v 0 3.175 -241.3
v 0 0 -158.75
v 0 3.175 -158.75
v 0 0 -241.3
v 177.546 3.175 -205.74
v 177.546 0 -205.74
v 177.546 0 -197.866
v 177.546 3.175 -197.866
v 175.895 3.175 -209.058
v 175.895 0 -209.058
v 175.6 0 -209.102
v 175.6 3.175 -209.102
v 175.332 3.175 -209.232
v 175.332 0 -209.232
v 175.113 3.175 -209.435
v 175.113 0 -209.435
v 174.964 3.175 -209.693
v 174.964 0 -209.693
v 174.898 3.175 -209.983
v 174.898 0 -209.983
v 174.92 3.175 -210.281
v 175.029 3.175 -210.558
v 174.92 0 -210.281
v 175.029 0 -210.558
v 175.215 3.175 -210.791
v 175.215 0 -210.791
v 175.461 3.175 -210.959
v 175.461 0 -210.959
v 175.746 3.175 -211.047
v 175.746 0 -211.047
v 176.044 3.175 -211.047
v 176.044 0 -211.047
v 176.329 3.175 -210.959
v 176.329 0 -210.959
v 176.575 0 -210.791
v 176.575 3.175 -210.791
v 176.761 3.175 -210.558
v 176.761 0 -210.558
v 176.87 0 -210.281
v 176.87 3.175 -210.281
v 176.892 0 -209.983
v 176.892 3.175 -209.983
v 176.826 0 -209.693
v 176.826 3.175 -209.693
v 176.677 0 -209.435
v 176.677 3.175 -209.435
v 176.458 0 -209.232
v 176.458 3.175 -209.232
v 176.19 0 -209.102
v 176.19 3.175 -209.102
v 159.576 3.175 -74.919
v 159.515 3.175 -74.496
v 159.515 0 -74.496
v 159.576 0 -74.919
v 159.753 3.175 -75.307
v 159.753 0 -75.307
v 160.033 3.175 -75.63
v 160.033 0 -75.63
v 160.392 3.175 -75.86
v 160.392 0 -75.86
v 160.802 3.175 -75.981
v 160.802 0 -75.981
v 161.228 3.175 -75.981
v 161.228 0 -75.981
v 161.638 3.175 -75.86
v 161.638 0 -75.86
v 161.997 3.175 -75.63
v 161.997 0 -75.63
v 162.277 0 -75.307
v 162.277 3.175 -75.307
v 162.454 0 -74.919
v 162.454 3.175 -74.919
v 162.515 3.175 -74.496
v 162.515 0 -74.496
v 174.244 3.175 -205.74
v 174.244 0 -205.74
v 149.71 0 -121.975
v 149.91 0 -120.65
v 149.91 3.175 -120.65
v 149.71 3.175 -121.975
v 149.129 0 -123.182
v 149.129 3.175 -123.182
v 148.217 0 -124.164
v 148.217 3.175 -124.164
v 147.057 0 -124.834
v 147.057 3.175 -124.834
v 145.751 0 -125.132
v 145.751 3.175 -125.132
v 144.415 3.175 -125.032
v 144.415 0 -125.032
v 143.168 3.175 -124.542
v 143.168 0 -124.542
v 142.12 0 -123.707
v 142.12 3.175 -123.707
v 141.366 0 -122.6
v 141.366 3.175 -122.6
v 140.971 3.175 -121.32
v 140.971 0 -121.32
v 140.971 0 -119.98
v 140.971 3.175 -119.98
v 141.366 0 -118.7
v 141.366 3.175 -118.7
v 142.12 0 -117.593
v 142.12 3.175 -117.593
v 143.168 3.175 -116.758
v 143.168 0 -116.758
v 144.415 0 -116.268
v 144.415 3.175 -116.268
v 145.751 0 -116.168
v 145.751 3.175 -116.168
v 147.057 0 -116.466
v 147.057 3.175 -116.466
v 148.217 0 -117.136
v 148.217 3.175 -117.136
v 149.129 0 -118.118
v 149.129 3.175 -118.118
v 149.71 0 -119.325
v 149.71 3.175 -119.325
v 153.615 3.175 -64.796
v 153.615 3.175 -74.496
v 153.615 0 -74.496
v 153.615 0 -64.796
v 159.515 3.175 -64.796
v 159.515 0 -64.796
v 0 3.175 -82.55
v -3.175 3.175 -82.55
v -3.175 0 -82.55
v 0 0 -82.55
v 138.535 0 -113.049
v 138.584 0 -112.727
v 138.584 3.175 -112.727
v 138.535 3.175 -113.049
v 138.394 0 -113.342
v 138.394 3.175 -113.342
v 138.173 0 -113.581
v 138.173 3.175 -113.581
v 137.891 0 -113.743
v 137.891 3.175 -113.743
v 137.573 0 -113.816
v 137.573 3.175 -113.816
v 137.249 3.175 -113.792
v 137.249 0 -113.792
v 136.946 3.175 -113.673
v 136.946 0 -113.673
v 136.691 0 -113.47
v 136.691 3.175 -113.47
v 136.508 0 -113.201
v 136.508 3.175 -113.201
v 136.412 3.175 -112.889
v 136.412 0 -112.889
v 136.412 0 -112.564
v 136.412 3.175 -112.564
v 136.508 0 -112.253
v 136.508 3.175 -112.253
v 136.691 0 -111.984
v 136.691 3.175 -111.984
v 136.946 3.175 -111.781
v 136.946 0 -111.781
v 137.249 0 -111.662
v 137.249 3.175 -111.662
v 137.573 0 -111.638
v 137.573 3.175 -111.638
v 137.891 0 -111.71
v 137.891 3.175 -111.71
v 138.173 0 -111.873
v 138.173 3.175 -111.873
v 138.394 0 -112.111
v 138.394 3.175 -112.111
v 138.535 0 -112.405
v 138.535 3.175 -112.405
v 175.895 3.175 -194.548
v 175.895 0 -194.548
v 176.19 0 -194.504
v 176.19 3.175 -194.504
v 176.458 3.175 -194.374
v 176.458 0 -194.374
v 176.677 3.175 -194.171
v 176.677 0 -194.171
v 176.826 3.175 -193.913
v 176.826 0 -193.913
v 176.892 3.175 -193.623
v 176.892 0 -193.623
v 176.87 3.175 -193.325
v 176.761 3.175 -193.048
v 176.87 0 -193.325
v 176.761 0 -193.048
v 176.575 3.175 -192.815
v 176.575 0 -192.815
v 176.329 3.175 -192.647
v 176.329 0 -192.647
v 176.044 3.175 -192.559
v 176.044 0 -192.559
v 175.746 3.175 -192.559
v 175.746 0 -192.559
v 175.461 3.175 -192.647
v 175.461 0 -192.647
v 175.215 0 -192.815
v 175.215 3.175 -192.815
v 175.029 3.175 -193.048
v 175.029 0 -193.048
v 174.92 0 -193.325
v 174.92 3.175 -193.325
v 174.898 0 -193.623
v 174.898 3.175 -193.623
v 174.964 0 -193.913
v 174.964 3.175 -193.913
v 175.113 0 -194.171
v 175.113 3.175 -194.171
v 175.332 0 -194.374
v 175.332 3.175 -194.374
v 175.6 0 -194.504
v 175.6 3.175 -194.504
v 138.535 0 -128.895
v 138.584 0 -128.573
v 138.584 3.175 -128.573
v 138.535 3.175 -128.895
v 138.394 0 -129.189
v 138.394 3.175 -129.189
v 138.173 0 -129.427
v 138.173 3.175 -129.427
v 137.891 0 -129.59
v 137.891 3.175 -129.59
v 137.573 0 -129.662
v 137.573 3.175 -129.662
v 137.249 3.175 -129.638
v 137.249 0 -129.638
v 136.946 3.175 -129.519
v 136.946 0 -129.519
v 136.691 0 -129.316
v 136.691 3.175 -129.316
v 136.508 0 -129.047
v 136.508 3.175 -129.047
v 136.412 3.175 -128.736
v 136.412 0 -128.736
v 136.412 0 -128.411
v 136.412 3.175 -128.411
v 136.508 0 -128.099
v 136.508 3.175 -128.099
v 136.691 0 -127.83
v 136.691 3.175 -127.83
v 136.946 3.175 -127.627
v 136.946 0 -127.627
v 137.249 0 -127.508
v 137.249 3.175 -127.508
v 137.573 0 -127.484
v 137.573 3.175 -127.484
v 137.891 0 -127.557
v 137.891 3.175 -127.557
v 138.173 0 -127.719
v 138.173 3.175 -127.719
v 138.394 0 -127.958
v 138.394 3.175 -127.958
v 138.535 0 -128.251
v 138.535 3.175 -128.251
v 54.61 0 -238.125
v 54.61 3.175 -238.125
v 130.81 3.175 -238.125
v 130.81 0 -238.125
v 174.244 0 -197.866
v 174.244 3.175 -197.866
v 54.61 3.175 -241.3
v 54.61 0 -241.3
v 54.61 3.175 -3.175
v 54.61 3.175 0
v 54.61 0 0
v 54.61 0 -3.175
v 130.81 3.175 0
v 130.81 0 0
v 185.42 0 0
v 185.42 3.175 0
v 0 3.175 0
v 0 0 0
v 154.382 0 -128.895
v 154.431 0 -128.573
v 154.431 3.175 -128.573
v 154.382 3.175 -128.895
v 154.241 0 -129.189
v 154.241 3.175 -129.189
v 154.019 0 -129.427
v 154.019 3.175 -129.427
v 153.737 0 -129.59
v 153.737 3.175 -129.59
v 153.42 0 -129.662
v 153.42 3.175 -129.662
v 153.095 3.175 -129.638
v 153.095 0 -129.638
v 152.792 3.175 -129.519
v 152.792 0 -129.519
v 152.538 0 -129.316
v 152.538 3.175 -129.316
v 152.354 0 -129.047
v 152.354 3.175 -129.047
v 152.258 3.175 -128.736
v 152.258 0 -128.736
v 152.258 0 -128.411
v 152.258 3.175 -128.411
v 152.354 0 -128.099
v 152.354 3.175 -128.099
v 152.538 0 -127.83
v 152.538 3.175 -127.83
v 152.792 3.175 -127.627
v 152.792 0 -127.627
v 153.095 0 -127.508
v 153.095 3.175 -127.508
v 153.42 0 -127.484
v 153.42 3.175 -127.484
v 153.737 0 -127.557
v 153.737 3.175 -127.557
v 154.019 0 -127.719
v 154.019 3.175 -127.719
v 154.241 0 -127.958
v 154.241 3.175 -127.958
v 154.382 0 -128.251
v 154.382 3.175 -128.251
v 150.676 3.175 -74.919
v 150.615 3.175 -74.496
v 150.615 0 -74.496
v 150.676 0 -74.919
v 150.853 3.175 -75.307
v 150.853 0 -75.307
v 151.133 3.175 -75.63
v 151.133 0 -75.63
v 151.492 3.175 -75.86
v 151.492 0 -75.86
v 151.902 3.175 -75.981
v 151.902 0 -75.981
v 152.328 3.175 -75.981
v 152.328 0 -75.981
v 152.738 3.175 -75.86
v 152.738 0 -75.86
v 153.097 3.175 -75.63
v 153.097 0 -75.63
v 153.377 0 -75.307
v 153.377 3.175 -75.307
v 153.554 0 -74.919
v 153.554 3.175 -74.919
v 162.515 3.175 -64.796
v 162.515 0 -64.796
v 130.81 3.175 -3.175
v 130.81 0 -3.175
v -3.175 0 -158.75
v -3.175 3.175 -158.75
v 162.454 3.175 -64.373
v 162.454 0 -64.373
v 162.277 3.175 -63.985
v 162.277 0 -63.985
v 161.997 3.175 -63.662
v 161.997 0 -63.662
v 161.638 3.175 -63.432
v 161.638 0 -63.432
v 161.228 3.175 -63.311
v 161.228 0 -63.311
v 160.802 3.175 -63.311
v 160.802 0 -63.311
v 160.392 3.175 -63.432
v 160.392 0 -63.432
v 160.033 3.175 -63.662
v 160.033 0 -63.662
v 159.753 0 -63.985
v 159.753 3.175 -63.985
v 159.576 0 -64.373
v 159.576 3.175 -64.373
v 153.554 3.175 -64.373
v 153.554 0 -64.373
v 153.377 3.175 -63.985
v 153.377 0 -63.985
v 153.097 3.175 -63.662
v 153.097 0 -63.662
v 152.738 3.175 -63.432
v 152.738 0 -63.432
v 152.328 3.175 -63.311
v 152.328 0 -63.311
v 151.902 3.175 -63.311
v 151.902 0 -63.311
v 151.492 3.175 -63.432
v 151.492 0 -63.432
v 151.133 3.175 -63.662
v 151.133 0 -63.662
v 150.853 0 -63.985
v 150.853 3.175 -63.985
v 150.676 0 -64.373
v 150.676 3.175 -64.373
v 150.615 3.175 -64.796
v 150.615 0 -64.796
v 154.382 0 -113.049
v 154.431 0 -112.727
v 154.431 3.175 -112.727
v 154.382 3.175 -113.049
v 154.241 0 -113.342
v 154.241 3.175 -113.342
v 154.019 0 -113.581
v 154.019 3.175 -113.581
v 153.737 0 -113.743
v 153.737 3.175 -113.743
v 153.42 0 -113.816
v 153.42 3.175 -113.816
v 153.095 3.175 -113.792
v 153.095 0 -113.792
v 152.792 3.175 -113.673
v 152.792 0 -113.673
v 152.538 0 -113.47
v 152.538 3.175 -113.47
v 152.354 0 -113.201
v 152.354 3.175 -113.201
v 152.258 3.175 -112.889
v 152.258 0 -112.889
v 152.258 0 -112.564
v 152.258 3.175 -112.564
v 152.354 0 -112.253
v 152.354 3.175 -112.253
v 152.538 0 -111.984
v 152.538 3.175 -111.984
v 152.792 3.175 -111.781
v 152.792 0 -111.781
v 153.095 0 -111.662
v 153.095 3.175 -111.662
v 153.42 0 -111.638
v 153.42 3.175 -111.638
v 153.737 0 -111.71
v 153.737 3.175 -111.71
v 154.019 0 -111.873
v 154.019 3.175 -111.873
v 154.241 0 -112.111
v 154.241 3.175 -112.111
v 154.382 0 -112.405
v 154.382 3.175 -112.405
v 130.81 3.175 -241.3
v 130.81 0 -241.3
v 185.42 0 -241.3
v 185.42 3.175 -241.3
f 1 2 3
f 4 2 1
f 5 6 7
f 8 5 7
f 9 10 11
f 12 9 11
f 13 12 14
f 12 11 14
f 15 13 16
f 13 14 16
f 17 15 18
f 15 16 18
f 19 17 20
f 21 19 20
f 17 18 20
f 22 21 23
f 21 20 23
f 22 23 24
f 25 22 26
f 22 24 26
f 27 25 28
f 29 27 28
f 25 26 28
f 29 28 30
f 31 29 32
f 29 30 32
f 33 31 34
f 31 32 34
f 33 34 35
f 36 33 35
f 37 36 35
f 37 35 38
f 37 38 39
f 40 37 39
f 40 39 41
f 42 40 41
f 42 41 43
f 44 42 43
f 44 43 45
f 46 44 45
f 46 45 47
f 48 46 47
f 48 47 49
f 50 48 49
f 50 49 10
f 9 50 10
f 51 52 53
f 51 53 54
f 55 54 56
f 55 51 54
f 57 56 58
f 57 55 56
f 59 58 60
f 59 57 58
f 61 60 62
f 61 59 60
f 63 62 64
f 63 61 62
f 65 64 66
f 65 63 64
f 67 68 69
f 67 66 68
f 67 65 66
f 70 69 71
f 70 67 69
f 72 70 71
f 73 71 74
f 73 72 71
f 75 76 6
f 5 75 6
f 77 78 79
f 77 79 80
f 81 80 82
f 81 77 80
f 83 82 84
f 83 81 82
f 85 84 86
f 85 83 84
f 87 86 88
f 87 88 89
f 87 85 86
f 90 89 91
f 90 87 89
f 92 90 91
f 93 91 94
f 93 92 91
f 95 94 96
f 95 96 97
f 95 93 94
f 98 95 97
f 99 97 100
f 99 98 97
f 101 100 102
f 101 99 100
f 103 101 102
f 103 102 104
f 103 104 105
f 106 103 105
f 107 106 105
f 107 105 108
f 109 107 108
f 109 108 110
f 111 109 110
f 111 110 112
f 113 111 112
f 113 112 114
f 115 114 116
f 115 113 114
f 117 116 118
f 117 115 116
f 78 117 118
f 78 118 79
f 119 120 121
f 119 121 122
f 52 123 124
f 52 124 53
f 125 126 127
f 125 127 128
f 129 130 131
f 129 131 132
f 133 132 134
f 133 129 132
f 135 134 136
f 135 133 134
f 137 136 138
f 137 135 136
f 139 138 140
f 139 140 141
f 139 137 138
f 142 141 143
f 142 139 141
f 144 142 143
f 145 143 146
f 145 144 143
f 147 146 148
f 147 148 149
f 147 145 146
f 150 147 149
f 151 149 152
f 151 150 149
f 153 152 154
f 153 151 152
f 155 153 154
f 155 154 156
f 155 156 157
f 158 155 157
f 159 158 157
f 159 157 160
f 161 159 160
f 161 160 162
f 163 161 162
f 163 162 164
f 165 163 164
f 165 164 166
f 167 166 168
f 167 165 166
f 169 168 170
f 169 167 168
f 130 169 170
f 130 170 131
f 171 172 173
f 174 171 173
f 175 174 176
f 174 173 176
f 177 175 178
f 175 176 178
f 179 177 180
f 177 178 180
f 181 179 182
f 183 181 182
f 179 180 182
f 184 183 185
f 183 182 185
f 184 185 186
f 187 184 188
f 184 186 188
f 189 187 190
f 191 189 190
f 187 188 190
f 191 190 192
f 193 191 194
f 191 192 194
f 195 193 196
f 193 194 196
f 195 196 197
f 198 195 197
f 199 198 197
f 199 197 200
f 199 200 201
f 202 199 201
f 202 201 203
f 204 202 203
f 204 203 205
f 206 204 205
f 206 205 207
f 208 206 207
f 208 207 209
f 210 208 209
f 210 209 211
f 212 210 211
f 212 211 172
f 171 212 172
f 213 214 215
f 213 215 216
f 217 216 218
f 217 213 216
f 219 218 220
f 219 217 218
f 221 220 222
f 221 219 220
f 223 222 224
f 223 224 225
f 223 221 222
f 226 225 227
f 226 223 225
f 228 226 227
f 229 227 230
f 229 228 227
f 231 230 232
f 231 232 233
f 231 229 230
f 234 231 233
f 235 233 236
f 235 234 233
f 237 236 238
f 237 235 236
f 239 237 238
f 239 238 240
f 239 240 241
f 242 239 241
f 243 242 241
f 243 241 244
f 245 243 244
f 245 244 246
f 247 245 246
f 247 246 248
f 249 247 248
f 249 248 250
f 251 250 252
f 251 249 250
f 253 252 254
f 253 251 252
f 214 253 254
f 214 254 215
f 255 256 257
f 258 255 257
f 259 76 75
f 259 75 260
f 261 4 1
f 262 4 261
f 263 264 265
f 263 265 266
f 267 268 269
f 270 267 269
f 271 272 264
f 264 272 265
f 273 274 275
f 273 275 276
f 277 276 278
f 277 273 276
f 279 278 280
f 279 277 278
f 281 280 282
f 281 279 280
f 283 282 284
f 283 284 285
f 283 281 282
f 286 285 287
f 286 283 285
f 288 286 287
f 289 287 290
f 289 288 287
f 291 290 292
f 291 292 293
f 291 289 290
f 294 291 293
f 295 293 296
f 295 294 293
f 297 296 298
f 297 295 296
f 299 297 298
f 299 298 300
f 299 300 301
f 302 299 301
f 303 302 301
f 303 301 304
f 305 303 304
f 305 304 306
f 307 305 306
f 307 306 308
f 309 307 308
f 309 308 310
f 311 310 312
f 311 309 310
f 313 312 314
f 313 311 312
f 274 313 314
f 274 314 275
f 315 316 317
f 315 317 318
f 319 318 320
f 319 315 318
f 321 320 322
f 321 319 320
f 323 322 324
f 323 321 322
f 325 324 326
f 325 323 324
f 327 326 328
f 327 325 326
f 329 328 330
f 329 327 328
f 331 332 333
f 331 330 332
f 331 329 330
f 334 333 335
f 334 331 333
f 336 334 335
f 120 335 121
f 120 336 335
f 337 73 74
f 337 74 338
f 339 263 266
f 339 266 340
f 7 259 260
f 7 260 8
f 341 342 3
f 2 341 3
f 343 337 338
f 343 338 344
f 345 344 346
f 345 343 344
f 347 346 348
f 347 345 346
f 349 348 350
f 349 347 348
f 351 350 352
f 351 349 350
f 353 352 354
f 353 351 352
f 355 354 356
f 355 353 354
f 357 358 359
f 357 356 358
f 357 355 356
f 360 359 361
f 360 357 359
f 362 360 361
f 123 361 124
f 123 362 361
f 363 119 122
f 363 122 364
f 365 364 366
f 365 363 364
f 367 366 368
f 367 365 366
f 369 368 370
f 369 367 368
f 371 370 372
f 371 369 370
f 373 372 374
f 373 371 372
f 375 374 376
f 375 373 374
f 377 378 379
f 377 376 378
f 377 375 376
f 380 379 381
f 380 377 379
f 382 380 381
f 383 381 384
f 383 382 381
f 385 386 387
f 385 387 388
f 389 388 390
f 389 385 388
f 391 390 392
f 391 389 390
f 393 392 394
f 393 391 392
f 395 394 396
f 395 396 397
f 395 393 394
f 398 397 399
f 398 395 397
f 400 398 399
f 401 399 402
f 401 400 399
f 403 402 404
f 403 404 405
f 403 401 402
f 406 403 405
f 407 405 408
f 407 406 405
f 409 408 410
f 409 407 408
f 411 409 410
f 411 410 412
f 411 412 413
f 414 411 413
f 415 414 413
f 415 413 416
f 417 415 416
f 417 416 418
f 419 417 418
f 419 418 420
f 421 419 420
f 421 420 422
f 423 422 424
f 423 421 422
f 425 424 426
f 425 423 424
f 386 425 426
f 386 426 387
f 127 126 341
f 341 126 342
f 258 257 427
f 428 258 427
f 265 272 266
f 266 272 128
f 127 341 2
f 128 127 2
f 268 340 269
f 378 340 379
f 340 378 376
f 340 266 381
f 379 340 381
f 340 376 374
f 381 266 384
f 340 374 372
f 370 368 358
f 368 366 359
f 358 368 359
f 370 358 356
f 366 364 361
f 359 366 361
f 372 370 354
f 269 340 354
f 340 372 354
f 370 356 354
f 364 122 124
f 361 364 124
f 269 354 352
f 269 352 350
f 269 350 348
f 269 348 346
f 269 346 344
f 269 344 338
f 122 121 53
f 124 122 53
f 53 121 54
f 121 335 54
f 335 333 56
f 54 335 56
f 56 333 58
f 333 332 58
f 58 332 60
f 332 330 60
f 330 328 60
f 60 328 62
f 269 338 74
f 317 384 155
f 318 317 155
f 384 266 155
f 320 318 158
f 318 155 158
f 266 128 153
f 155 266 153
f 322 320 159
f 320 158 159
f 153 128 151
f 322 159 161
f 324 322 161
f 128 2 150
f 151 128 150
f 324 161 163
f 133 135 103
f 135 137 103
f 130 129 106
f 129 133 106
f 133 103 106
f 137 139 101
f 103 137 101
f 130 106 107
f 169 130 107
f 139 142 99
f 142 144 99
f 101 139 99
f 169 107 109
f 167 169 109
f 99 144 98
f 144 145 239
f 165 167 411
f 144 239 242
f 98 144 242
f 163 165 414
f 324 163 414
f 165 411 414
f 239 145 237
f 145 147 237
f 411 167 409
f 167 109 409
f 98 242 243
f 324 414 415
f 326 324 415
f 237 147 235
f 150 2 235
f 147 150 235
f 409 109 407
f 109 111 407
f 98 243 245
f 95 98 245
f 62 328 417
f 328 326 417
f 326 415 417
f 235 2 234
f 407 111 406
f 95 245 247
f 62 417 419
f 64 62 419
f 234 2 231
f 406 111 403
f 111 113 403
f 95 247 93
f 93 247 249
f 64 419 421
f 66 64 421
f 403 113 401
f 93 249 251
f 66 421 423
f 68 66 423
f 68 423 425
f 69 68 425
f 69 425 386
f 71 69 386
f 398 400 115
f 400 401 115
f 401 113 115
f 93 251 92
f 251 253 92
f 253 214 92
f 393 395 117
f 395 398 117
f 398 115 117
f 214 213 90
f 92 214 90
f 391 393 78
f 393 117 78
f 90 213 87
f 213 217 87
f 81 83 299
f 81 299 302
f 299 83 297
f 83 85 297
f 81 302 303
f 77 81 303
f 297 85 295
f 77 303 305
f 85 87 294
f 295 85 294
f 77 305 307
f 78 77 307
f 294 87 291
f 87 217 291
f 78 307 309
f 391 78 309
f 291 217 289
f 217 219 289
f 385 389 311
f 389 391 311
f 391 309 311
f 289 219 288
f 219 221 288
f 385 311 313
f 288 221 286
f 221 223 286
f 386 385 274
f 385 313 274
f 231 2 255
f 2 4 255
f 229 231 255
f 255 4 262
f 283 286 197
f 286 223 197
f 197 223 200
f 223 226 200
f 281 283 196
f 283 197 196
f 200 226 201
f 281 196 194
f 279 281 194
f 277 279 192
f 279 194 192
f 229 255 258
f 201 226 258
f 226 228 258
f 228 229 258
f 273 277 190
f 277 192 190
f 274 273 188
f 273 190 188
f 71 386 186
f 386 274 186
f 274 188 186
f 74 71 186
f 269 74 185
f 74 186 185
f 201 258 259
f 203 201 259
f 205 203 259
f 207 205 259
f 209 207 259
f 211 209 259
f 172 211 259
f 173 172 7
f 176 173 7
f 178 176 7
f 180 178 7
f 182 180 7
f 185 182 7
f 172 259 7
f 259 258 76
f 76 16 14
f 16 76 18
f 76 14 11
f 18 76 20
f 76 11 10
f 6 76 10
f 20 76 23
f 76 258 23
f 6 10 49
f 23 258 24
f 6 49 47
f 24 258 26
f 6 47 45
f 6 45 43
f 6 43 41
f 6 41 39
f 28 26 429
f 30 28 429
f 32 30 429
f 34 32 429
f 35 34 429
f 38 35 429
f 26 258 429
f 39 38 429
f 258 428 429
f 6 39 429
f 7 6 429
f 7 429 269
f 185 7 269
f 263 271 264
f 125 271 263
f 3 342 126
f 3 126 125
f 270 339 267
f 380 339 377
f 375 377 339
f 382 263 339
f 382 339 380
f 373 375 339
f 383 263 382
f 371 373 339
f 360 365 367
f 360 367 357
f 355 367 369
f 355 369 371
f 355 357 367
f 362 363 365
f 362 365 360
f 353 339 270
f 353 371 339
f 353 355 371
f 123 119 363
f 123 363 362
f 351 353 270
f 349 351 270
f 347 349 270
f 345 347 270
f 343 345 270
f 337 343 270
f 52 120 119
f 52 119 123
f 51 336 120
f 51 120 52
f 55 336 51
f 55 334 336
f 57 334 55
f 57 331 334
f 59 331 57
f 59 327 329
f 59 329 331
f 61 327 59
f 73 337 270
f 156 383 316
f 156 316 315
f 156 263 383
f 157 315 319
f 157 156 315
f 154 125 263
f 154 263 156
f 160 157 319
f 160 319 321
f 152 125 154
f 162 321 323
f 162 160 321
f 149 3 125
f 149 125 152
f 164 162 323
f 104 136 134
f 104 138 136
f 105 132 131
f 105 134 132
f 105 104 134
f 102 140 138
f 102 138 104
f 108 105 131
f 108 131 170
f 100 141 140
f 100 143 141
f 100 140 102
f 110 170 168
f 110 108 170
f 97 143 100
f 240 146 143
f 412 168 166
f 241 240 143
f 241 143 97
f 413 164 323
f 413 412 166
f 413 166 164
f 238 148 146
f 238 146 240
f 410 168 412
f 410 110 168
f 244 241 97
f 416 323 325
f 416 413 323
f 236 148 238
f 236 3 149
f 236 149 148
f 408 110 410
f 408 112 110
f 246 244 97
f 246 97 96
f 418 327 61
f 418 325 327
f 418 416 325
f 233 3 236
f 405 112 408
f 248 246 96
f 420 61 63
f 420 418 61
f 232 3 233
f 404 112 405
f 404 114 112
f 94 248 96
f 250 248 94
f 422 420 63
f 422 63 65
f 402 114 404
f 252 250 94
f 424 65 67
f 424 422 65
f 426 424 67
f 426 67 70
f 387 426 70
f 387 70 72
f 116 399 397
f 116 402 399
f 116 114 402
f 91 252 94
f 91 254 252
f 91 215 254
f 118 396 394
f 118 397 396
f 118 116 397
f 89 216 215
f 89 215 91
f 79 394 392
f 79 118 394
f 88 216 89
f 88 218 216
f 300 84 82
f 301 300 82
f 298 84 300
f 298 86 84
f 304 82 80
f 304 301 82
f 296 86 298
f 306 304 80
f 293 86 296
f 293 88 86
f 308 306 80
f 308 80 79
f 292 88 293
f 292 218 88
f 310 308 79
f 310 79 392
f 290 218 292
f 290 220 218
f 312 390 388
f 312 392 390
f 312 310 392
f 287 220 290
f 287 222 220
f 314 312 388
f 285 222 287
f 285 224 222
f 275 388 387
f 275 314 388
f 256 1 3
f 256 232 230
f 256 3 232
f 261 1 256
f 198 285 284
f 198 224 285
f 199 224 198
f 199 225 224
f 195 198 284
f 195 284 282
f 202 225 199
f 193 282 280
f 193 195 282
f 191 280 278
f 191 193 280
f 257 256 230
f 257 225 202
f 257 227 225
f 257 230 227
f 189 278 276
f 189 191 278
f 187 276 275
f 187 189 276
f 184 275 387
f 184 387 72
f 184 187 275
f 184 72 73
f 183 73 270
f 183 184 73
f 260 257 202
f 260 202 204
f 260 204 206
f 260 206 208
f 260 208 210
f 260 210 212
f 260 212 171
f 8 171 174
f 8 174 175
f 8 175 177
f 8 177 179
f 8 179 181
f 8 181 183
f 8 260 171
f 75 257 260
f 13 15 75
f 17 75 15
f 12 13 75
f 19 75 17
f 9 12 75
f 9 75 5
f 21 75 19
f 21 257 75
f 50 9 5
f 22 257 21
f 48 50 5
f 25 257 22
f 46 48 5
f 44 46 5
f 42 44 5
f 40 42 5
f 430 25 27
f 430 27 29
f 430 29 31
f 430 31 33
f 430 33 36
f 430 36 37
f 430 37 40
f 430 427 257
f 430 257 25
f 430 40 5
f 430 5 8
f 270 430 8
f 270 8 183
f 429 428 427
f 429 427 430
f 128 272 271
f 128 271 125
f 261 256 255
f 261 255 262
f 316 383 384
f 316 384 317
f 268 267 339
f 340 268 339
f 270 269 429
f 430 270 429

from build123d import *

# Parameters (mm, degrees)
SKETCH1_W                = 185.42
SKETCH1_H                = 241.3
BOSS_EXTRUDE1_DEPTH      = 3.175
CUT_EXTRUDE1_OUTLINE_R   = 4.49453
CUT_EXTRUDE1_OUTLINE_R_2 = 1.0922
CUT_EXTRUDE1_DEPTH       = 3.175
CUT_EXTRUDE2_DEPTH       = 305.329339737
SKETCH8_R                = 1
SKETCH8_W                = 3.302
SKETCH8_H                = 7.874
CUT_EXTRUDE4_DEPTH       = 305.329339737
SKETCH9_W                = 76.2
SKETCH9_H                = 3.175
CUT_EXTRUDE5_DEPTH       = 305.329339737
SKETCH10_W               = 3.175
SKETCH10_H               = 76.2
BOSS_EXTRUDE4_DEPTH      = 3.175


# Read off the part's stored shape, not the designer's step: Cut-Extrude1
with BuildPart() as part:
    # Sketch1 → Boss-Extrude1 (new body)
    with BuildSketch(Plane(origin=(0, 0, 0), x_dir=(1, 0, 0), z_dir=(0, 1, 0))):
        with Locations((92.71, 120.65)):
            Rectangle(SKETCH1_W, SKETCH1_H)
    extrude(amount=BOSS_EXTRUDE1_DEPTH)

    # Cut-Extrude1 outline → Cut-Extrude1 (cut)
    with BuildSketch(Plane(origin=(0, 0, 0), x_dir=(1, 0, 0), z_dir=(0, 1, 0))):
        with Locations((145.415, 120.65)):
            Circle(CUT_EXTRUDE1_OUTLINE_R)
        with Locations((153.338312588, 128.573312588)):
            Circle(CUT_EXTRUDE1_OUTLINE_R_2)
        with Locations((137.491687412, 128.573312588)):
            Circle(CUT_EXTRUDE1_OUTLINE_R_2)
        with Locations((137.491687412, 112.726687412)):
            Circle(CUT_EXTRUDE1_OUTLINE_R_2)
        with Locations((153.338312588, 112.726687412)):
            Circle(CUT_EXTRUDE1_OUTLINE_R_2)
    extrude(amount=CUT_EXTRUDE1_DEPTH, mode=Mode.SUBTRACT)

    # Sketch6 → Cut-Extrude2 (cut, through all)
    with BuildSketch(Plane(origin=(0, 3.175, 0), x_dir=(1, 0, 0), z_dir=(0, 1, 0))):
        with BuildLine():
            Line((150.615, 64.796000096), (150.615, 74.496000096))
            ThreePointArc((150.615, 74.496000096), (152.115, 75.996000096), (153.615, 74.496000096))
            Line((153.615, 74.496000096), (153.615, 64.796000096))
            ThreePointArc((153.615, 64.796000096), (152.115, 63.296000096), (150.615, 64.796000096))
        make_face()
        with BuildLine():
            Line((159.515, 64.796000096), (159.515, 74.496000096))
            ThreePointArc((159.515, 74.496000096), (161.015, 75.996000096), (162.515, 74.496000096))
            Line((162.515, 74.496000096), (162.515, 64.796000096))
            ThreePointArc((162.515, 64.796000096), (161.015, 63.296000096), (159.515, 64.796000096))
        make_face()
    extrude(amount=-CUT_EXTRUDE2_DEPTH, mode=Mode.SUBTRACT)

    # Sketch8 → Cut-Extrude4 (cut, through all)
    with BuildSketch(Plane.XZ):
        with Locations(Location((175.895, -193.548, 0), (0, 0, 270))):
            Circle(SKETCH8_R)
        with Locations(Location((175.895, -210.058, 0), (0, 0, 90))):
            Circle(SKETCH8_R)
        with Locations((175.895, -201.803)):
            Rectangle(SKETCH8_W, SKETCH8_H)
    extrude(amount=-CUT_EXTRUDE4_DEPTH, mode=Mode.SUBTRACT)

    # Sketch9 → Cut-Extrude5 (cut, through all)
    with BuildSketch(Plane(origin=(0, 3.175, 0), x_dir=(1, 0, 0), z_dir=(0, 1, 0))):
        with Locations((92.71, 239.7125)):
            Rectangle(SKETCH9_W, SKETCH9_H)
        with Locations((92.71, 1.5875)):
            Rectangle(SKETCH9_W, SKETCH9_H)
    extrude(amount=-CUT_EXTRUDE5_DEPTH, mode=Mode.SUBTRACT)

    # Sketch10 → Boss-Extrude4 (add)
    with BuildSketch(Plane(origin=(0, 3.175, 0), x_dir=(1, 0, 0), z_dir=(0, 1, 0))):
        with Locations((-1.5875, 120.65)):
            Rectangle(SKETCH10_W, SKETCH10_H)
    extrude(amount=-BOSS_EXTRUDE4_DEPTH)


solid = part.part
